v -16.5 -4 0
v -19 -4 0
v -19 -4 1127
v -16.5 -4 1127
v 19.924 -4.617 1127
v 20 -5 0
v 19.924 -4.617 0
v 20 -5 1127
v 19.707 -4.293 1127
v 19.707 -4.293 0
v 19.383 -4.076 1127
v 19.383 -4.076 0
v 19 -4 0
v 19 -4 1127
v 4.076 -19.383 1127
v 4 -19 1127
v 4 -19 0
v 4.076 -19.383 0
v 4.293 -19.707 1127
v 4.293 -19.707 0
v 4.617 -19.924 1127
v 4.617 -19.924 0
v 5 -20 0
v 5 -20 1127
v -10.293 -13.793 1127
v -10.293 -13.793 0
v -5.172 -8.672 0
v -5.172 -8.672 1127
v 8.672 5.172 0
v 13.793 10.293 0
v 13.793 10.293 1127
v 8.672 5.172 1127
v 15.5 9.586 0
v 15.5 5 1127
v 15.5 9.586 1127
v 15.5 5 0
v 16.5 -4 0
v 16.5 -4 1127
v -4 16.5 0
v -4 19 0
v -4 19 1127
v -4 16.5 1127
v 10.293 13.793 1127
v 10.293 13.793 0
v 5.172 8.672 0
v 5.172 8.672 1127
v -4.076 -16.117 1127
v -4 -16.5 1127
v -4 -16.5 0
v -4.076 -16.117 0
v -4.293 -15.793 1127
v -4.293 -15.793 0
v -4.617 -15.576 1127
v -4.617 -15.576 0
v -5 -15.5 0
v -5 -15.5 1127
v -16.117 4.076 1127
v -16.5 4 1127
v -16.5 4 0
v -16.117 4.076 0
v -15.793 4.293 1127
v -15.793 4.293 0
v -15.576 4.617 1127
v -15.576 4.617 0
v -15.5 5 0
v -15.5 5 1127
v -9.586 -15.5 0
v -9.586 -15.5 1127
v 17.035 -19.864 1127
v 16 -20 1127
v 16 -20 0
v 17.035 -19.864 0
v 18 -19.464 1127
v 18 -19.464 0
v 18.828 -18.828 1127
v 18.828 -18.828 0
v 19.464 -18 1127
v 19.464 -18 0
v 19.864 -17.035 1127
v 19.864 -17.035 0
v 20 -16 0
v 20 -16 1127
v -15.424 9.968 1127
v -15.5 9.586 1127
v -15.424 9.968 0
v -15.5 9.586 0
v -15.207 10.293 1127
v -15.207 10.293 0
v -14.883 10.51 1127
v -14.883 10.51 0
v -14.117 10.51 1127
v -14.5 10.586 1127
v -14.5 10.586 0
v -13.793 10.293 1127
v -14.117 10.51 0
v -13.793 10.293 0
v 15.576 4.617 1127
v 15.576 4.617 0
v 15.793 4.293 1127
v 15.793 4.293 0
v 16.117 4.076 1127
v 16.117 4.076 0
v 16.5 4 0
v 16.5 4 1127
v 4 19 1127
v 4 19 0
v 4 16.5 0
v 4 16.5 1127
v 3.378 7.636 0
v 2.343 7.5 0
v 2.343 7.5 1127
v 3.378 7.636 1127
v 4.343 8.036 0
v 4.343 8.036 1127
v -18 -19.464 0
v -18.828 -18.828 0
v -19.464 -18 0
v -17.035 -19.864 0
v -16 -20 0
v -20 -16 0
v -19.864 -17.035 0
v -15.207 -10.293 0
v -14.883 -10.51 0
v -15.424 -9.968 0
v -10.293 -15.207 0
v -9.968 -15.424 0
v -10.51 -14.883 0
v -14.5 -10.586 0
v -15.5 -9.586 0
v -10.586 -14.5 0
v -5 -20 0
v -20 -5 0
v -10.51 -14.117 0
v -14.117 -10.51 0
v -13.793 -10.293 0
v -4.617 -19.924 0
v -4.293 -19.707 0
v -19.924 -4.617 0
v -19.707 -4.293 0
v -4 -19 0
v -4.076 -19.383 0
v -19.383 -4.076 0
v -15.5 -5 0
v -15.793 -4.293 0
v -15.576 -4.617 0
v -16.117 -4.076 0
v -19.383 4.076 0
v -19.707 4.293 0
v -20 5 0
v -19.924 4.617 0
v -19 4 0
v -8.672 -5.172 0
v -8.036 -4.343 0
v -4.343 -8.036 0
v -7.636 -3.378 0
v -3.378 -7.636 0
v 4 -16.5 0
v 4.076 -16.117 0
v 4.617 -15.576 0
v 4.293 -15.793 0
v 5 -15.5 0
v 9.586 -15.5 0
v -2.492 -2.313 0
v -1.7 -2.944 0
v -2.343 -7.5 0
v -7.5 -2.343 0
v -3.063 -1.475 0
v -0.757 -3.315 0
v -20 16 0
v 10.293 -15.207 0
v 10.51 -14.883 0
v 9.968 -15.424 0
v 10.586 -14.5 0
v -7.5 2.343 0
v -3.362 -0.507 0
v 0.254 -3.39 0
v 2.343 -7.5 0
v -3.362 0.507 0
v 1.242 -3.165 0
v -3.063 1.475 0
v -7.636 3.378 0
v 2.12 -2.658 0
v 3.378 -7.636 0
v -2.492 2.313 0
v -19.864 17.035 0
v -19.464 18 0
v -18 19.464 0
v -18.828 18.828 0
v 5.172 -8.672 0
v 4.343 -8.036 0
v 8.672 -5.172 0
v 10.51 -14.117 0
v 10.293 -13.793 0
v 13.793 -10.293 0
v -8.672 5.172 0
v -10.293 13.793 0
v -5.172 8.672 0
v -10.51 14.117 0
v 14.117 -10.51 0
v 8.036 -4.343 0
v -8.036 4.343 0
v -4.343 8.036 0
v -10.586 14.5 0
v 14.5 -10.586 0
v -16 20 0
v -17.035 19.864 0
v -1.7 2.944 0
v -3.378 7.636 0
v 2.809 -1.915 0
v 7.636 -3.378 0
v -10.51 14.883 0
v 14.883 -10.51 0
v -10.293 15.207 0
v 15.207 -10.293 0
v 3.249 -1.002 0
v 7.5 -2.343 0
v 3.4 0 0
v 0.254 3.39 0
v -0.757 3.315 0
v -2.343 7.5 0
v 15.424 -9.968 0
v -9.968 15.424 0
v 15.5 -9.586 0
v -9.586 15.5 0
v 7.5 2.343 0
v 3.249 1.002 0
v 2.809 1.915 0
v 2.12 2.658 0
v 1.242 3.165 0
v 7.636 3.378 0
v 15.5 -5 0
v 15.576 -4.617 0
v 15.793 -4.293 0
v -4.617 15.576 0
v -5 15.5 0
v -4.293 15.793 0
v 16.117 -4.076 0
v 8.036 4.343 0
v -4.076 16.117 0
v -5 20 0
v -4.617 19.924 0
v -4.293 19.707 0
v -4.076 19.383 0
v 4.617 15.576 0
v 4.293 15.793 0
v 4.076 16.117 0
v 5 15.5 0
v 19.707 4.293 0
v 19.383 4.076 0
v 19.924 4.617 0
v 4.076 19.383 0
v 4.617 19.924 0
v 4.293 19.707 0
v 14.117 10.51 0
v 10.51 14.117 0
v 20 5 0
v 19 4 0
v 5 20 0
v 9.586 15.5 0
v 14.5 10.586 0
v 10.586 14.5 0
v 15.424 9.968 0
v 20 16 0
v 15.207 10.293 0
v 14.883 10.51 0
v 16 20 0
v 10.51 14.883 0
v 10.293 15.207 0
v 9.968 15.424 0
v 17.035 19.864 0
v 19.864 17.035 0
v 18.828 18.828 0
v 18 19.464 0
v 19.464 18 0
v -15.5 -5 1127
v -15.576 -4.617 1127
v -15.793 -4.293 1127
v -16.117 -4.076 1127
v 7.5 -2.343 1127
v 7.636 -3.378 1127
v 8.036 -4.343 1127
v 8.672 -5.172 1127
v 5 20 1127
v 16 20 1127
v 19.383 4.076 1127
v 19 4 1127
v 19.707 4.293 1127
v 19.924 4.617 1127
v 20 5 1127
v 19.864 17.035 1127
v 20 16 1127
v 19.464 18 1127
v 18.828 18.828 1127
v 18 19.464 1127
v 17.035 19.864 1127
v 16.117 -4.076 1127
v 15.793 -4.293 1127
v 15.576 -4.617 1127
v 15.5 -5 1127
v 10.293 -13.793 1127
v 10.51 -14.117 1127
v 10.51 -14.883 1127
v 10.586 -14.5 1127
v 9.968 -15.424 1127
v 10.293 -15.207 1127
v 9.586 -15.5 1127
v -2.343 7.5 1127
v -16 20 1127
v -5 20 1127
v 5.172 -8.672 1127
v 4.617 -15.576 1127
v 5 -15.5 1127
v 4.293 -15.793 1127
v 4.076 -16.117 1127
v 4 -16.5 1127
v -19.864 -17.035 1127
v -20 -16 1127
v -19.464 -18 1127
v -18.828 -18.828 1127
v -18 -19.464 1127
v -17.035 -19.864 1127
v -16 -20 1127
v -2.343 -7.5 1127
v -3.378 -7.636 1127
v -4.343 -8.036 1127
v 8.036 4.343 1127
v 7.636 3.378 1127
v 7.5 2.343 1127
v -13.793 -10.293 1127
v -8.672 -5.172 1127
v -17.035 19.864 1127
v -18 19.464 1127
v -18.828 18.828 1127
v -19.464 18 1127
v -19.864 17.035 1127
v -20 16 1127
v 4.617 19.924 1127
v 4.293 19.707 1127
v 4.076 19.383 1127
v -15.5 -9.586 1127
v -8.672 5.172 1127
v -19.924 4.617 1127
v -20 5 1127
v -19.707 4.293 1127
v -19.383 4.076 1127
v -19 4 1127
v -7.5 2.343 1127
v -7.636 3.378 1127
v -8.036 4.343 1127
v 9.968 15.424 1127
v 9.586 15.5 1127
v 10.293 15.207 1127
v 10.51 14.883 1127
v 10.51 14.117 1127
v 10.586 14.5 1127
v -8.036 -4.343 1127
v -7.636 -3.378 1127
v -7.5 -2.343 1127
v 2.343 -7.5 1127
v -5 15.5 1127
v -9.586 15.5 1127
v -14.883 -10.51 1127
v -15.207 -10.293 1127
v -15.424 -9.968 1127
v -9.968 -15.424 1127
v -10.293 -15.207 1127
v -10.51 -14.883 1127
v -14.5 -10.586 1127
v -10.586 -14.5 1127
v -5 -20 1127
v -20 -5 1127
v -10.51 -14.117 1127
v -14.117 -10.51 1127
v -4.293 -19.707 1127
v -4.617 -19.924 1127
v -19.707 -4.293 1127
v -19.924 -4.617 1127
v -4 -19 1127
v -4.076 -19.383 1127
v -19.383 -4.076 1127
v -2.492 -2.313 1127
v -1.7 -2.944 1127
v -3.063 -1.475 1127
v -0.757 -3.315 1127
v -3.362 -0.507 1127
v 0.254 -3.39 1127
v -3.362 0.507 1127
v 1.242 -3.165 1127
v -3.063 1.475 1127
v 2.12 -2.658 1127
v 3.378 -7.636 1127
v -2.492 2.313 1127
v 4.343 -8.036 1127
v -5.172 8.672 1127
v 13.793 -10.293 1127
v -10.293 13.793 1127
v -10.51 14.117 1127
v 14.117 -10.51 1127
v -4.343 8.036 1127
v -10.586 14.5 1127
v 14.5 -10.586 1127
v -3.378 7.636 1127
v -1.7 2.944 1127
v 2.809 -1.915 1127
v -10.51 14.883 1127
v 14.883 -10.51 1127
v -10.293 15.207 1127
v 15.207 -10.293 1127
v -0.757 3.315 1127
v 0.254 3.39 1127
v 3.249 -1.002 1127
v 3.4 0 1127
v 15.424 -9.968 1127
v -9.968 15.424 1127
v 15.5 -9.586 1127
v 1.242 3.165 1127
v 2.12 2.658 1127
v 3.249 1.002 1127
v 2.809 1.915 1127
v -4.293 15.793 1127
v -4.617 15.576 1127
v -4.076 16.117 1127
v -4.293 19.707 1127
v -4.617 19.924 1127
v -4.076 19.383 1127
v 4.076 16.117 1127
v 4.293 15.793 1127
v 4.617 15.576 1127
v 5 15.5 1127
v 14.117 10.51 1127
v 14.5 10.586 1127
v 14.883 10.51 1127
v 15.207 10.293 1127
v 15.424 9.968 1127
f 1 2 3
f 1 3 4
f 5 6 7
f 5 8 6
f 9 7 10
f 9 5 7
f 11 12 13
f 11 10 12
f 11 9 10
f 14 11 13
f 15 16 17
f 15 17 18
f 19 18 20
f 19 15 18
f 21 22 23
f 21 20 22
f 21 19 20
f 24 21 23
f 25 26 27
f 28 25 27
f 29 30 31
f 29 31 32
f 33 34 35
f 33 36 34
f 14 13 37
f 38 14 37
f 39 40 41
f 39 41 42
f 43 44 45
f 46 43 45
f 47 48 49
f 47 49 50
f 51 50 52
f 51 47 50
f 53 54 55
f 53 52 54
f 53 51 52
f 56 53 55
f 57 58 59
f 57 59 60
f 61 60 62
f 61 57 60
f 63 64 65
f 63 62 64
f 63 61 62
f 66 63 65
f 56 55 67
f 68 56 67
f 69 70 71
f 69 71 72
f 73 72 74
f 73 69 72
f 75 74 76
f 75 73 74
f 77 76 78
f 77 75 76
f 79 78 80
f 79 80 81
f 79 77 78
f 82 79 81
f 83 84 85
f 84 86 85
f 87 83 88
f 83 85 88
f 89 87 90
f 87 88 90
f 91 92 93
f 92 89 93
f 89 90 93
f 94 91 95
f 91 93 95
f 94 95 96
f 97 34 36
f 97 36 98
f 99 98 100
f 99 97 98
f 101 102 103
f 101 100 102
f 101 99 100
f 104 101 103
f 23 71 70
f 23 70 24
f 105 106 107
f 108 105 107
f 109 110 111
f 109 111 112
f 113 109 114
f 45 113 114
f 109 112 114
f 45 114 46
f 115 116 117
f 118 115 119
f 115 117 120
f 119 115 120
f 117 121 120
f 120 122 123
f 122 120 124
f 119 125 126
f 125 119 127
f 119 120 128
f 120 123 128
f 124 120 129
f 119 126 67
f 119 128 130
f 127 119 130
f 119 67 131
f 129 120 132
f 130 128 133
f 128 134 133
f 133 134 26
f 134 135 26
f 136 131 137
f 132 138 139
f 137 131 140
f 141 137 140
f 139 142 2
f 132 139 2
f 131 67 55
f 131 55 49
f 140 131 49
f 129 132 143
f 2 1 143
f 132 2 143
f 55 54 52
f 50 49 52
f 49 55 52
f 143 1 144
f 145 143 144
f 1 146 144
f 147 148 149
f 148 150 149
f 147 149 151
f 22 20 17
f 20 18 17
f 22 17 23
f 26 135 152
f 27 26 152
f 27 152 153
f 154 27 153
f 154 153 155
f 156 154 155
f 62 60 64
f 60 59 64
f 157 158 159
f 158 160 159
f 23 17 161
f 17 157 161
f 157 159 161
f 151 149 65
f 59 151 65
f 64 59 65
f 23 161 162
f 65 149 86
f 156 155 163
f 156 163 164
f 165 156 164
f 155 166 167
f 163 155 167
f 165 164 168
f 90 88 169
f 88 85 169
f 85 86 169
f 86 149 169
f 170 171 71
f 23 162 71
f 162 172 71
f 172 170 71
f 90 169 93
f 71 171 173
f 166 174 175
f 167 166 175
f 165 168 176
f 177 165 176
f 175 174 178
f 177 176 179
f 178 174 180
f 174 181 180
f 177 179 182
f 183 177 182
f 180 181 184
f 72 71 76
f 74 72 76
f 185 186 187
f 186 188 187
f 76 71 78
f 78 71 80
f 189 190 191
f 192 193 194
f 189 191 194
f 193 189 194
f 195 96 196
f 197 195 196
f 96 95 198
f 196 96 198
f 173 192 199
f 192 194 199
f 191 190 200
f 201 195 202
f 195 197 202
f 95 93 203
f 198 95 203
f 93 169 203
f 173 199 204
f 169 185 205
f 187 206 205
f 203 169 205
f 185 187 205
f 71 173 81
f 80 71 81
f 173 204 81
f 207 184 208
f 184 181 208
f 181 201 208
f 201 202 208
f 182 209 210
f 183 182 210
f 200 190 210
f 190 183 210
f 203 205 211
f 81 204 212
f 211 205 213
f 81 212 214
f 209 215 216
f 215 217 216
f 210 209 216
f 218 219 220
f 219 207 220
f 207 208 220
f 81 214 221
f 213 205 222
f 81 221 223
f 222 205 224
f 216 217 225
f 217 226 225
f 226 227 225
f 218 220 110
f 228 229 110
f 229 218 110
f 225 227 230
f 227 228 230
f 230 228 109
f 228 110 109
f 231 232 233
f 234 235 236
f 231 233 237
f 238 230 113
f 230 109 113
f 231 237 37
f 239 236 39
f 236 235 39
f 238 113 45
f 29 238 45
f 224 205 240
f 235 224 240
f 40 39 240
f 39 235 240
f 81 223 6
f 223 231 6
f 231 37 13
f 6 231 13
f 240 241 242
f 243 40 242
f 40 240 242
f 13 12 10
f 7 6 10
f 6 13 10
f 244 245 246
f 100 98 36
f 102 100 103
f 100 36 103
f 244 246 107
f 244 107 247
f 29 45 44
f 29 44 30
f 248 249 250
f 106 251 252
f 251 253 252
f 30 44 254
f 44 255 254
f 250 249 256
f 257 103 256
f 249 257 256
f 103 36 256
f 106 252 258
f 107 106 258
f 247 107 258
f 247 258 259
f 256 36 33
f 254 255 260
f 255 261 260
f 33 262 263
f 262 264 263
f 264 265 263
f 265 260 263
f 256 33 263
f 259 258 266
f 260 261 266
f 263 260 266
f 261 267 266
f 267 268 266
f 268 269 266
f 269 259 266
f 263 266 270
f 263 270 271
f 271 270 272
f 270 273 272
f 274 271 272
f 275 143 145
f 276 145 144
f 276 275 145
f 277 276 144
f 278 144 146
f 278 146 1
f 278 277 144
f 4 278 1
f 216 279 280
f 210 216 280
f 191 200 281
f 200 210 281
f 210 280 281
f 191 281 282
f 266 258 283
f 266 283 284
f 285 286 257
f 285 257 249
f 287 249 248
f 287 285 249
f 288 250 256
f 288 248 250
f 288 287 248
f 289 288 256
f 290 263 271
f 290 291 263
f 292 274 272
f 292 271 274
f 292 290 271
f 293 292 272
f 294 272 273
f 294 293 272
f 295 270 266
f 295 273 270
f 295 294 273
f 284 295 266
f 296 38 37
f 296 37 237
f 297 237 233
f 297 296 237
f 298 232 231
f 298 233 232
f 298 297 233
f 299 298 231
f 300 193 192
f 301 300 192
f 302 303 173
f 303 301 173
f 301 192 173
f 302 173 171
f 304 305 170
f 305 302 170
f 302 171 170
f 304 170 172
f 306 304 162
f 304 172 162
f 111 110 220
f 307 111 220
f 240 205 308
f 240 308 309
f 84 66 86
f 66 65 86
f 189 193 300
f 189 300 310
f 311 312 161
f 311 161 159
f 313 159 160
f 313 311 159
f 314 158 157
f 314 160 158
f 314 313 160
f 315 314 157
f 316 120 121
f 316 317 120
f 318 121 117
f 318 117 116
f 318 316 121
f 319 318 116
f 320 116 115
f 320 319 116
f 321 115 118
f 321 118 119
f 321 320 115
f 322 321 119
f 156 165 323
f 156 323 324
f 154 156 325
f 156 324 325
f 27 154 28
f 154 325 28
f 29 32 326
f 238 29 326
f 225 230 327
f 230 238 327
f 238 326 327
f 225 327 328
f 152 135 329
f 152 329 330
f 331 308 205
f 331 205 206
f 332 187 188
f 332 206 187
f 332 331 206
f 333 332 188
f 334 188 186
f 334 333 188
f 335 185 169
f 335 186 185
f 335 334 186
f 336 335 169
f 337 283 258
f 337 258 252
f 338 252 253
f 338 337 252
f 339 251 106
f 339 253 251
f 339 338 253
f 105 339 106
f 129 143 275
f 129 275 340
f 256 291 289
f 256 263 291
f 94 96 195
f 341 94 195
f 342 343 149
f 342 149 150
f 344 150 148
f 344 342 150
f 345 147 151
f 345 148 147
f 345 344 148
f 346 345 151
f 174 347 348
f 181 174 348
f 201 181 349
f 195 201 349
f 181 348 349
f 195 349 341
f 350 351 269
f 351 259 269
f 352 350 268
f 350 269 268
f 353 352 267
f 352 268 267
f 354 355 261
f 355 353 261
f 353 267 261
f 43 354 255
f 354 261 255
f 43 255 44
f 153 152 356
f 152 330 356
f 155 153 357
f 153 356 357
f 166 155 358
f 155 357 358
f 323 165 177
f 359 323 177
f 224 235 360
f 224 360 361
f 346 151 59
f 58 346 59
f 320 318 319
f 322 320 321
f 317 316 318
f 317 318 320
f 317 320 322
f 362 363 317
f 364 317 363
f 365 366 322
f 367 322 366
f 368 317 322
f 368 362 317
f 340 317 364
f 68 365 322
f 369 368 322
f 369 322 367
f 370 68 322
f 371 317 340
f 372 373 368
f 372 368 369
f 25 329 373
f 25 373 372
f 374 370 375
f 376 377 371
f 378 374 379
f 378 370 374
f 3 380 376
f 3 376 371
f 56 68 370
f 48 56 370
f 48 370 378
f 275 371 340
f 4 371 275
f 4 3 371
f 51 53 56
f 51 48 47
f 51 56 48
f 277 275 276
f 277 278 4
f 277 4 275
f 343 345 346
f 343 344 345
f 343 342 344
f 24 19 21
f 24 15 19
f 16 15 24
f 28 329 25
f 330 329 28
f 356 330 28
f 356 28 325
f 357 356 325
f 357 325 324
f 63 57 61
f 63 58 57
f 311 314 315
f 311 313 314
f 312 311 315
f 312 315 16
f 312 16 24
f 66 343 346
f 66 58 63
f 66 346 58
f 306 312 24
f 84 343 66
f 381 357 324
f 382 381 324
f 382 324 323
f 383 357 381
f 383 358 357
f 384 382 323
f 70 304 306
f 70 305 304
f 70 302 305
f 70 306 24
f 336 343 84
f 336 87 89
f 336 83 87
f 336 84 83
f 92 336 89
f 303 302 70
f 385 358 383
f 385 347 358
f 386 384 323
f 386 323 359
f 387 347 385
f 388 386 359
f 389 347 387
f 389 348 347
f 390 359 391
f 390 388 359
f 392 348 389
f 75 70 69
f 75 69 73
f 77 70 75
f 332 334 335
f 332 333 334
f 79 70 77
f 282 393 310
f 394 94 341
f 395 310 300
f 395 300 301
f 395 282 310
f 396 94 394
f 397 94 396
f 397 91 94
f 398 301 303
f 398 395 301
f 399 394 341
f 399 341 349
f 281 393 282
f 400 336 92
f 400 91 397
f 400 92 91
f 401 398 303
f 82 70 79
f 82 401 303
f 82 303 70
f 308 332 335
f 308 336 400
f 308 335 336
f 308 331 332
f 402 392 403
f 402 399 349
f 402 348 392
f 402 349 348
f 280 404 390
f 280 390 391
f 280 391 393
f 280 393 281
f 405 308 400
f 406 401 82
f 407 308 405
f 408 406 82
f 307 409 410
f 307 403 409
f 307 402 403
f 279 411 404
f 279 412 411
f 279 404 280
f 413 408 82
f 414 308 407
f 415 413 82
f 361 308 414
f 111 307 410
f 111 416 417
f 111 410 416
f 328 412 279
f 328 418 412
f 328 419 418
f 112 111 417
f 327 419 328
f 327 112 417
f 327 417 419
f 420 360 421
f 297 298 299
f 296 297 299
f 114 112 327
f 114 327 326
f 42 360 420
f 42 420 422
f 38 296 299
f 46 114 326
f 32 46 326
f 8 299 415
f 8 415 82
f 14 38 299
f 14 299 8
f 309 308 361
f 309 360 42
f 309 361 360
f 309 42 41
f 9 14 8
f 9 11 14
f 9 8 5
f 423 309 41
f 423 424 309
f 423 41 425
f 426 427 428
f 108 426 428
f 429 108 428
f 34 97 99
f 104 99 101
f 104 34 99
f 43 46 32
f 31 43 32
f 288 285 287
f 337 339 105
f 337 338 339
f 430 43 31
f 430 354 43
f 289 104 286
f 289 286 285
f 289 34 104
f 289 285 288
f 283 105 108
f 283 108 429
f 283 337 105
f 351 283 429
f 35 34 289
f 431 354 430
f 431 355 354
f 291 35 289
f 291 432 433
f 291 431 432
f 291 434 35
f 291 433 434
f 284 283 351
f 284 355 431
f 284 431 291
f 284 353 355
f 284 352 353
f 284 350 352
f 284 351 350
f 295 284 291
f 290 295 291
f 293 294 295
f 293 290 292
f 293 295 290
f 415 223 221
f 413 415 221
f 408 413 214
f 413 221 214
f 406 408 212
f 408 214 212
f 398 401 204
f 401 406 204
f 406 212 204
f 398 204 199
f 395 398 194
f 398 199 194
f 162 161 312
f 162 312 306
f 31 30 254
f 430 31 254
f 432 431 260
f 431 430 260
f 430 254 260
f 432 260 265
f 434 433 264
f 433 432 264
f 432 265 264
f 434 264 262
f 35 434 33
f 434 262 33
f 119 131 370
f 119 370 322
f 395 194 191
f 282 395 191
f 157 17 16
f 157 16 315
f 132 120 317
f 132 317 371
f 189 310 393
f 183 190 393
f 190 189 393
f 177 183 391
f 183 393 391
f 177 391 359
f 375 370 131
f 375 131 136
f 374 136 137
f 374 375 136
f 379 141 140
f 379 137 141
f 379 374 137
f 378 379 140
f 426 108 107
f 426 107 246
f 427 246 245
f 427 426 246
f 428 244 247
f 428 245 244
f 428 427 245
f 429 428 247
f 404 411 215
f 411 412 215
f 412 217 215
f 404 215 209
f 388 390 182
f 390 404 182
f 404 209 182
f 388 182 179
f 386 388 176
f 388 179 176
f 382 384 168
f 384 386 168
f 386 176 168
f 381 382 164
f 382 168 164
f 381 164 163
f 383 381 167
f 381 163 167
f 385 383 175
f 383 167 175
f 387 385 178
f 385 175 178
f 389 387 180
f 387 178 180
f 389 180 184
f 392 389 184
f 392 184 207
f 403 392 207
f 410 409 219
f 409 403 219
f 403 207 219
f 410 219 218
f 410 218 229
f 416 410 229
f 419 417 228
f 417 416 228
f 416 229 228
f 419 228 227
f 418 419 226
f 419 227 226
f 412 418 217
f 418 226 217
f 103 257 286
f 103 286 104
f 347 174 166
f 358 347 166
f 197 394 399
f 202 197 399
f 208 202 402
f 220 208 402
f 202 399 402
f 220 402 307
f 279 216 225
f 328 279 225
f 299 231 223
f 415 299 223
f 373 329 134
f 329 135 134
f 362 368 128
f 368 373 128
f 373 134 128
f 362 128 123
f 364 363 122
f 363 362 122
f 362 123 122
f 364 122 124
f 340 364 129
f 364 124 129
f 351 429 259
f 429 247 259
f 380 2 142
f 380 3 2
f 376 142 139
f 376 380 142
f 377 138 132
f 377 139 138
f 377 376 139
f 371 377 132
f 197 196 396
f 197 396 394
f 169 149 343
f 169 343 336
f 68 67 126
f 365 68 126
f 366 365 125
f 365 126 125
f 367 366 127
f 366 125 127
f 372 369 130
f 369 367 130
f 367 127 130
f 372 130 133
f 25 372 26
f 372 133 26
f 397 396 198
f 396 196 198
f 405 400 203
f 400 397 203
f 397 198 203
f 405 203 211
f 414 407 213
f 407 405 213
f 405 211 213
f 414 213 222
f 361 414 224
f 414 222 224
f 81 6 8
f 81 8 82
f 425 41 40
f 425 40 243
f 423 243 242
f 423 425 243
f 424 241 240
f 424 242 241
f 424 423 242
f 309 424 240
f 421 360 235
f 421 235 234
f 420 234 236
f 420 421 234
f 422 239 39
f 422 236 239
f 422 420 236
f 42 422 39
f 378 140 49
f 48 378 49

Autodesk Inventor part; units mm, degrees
ref_plane "YZ Plane" through (0, 0, 0) normal (1, 0, 0) x (0, 1, 0)
ref_plane "XZ Plane" through (0, 0, 0) normal (0, 1, 0) x (-1, 0, 0)
ref_plane "XY Plane" through (0, 0, 0) normal (0, 0, 1) x (1, 0, 0)
sketch "T-Slot 4040 Base" plane through (0, 0, 0) normal (0, 0, 1) x (1, 0, 0)
  line L0 (-28, 0) -> (28, 0) construction
  line L1 (0, -28) -> (0, 28) construction
  circle A0 centre (0, 0) radius 3.4
  line L2 (-7.5, -7.5) -> (7.5, -7.5)
  line L3 (7.5, -7.5) -> (7.5, 7.5)
  line L4 (7.5, 7.5) -> (-7.5, 7.5)
  line L5 (-7.5, 7.5) -> (-7.5, -7.5)
  line L6 (-7.5, -7.5) -> (7.5, 7.5) construction
  line L7 (7.5, -7.5) -> (-7.5, 7.5) construction
  line L8 (20, 4) -> (15.5, 4)
  line L9 (15.5, 4) -> (15.5, 12)
  line L10 (15.5, 12) -> (7.5, 4)
  line L11 (4, 20) -> (4, 15.5)
  line L12 (4, 15.5) -> (12, 15.5)
  line L13 (12, 15.5) -> (4, 7.5)
  line L14 (7.5, -7.5) -> (-7.5, -7.5)
  arc A1 (15.5, 9.5858) -> (13.7929, 10.2929) centre (14.5, 9.5858) ccw
  arc A2 (10.2929, 13.7929) -> (9.5858, 15.5) centre (9.5858, 14.5) ccw
  line L15 (-20, 20) -> (20, 20)
  line L16 (20, 20) -> (20, -20)
  line L17 (20, -20) -> (-20, -20)
  line L18 (-20, -20) -> (-20, 20)
  line L19 (-20, 20) -> (20, -20) construction
  line L20 (20, 20) -> (-20, -20) construction
  line L21 (-4, 15.5) -> (-12, 15.5)
  arc A3 (-9.5858, 15.5) -> (-10.2929, 13.7929) centre (-9.5858, 14.5) ccw
  line L22 (-12, 15.5) -> (-4, 7.5)
  line L23 (-15.5, 12) -> (-7.5, 4)
  line L24 (-20, 4) -> (-15.5, 4)
  arc A4 (-13.7929, 10.2929) -> (-15.5, 9.5858) centre (-14.5, 9.5858) ccw
  line L25 (-15.5, 4) -> (-15.5, 12)
  line L26 (-4, 20) -> (-4, 15.5)
  line L27 (-15.5, -4) -> (-15.5, -12)
  arc A5 (-15.5, -9.5858) -> (-13.7929, -10.2929) centre (-14.5, -9.5858) ccw
  line L28 (-15.5, -12) -> (-7.5, -4)
  line L29 (-12, -15.5) -> (-4, -7.5)
  line L30 (-4, -20) -> (-4, -15.5)
  arc A6 (-10.2929, -13.7929) -> (-9.5858, -15.5) centre (-9.5858, -14.5) ccw
  line L31 (-4, -15.5) -> (-12, -15.5)
  line L32 (-20, -4) -> (-15.5, -4)
  line L33 (4, -15.5) -> (12, -15.5)
  arc A7 (9.5858, -15.5) -> (10.2929, -13.7929) centre (9.5858, -14.5) ccw
  line L34 (12, -15.5) -> (4, -7.5)
  line L35 (15.5, -12) -> (7.5, -4)
  line L36 (20, -4) -> (15.5, -4)
  arc A8 (13.7929, -10.2929) -> (15.5, -9.5858) centre (14.5, -9.5858) ccw
  line L37 (15.5, -4) -> (15.5, -12)
  line L38 (4, -20) -> (4, -15.5)
  point P0 (4.9274, 7.75)
  point P1 (9.5858, 15.5)
  point P2 (-20, 20)
  point P3 (-7.5, -7.5)
  point P4 (-20, -20)
  point P5 (7.5, -7.5)
  point P6 (20, -20)
  point P7 (-9.5858, -15.5)
  point P8 (-4, -7.5)
  point P9 (15.5, -9.5858)
  point P10 (7.5, -4)
  point P11 (-15.5, 9.5858)
  point P12 (-4, 7.5)
  dimension "d35" = 6.8
  dimension "d37" = 12
  dimension "d38" = 1
  dimension "d43" = 40
  dimension "d44" = 40
  dimension "d45" = 4.5
  dimension "d46" = 4
  dimension "d53" = 360
extrude "Extrusion1" add sketch "T-Slot 4040 Base" along normal blind 1127 contours L5 L4 L3 L2 | L2 L29 L31 L30 L17 L18 L32 L27 L28 L5 | L2 L3 L35 L37 L36 L16 L17 L38 L33 L34 | A6 L31 L29 | L23 L25 L24 L18 L15 L26 L21 L22 L4 L5 | L28 L27 A5 | L34 L33 A7 | A4 L25 L23 | L3 L4 L13 L12 L11 L15 L16 L8 L9 L10 | A8 L37 L35 | L22 L21 A3 | L10 L9 A1 | A2 L12 L13
fillet "Rundung1" radius 1 16 edges at (4, 15.5, 563.5) (15.5, 4, 563.5) (20, 4, 563.5) (4, 20, 563.5) (-20, 4, 563.5) (-15.5, 4, 563.5) (-4, 15.5, 563.5) (-4, 20, 563.5) (-4, -15.5, 563.5) (-4, -20, 563.5) (4, -15.5, 563.5) (4, -20, 563.5) (15.5, -4, 563.5) (20, -4, 563.5) (-20, -4, 563.5) (-15.5, -4, 563.5)
fillet "Rundung2" radius 4 12 edges at (4, 7.5, 563.5) (7.5, 4, 563.5) (-20, 20, 563.5) (-20, -20, 563.5) (20, 20, 563.5) (20, -20, 563.5) (7.5, -4, 563.5) (-7.5, -4, 563.5) (-7.5, 4, 563.5) (4, -7.5, 563.5) (-4, -7.5, 563.5) (-4, 7.5, 563.5)
properties part number "T-SLOT 4040 B-Type 1127mm"
